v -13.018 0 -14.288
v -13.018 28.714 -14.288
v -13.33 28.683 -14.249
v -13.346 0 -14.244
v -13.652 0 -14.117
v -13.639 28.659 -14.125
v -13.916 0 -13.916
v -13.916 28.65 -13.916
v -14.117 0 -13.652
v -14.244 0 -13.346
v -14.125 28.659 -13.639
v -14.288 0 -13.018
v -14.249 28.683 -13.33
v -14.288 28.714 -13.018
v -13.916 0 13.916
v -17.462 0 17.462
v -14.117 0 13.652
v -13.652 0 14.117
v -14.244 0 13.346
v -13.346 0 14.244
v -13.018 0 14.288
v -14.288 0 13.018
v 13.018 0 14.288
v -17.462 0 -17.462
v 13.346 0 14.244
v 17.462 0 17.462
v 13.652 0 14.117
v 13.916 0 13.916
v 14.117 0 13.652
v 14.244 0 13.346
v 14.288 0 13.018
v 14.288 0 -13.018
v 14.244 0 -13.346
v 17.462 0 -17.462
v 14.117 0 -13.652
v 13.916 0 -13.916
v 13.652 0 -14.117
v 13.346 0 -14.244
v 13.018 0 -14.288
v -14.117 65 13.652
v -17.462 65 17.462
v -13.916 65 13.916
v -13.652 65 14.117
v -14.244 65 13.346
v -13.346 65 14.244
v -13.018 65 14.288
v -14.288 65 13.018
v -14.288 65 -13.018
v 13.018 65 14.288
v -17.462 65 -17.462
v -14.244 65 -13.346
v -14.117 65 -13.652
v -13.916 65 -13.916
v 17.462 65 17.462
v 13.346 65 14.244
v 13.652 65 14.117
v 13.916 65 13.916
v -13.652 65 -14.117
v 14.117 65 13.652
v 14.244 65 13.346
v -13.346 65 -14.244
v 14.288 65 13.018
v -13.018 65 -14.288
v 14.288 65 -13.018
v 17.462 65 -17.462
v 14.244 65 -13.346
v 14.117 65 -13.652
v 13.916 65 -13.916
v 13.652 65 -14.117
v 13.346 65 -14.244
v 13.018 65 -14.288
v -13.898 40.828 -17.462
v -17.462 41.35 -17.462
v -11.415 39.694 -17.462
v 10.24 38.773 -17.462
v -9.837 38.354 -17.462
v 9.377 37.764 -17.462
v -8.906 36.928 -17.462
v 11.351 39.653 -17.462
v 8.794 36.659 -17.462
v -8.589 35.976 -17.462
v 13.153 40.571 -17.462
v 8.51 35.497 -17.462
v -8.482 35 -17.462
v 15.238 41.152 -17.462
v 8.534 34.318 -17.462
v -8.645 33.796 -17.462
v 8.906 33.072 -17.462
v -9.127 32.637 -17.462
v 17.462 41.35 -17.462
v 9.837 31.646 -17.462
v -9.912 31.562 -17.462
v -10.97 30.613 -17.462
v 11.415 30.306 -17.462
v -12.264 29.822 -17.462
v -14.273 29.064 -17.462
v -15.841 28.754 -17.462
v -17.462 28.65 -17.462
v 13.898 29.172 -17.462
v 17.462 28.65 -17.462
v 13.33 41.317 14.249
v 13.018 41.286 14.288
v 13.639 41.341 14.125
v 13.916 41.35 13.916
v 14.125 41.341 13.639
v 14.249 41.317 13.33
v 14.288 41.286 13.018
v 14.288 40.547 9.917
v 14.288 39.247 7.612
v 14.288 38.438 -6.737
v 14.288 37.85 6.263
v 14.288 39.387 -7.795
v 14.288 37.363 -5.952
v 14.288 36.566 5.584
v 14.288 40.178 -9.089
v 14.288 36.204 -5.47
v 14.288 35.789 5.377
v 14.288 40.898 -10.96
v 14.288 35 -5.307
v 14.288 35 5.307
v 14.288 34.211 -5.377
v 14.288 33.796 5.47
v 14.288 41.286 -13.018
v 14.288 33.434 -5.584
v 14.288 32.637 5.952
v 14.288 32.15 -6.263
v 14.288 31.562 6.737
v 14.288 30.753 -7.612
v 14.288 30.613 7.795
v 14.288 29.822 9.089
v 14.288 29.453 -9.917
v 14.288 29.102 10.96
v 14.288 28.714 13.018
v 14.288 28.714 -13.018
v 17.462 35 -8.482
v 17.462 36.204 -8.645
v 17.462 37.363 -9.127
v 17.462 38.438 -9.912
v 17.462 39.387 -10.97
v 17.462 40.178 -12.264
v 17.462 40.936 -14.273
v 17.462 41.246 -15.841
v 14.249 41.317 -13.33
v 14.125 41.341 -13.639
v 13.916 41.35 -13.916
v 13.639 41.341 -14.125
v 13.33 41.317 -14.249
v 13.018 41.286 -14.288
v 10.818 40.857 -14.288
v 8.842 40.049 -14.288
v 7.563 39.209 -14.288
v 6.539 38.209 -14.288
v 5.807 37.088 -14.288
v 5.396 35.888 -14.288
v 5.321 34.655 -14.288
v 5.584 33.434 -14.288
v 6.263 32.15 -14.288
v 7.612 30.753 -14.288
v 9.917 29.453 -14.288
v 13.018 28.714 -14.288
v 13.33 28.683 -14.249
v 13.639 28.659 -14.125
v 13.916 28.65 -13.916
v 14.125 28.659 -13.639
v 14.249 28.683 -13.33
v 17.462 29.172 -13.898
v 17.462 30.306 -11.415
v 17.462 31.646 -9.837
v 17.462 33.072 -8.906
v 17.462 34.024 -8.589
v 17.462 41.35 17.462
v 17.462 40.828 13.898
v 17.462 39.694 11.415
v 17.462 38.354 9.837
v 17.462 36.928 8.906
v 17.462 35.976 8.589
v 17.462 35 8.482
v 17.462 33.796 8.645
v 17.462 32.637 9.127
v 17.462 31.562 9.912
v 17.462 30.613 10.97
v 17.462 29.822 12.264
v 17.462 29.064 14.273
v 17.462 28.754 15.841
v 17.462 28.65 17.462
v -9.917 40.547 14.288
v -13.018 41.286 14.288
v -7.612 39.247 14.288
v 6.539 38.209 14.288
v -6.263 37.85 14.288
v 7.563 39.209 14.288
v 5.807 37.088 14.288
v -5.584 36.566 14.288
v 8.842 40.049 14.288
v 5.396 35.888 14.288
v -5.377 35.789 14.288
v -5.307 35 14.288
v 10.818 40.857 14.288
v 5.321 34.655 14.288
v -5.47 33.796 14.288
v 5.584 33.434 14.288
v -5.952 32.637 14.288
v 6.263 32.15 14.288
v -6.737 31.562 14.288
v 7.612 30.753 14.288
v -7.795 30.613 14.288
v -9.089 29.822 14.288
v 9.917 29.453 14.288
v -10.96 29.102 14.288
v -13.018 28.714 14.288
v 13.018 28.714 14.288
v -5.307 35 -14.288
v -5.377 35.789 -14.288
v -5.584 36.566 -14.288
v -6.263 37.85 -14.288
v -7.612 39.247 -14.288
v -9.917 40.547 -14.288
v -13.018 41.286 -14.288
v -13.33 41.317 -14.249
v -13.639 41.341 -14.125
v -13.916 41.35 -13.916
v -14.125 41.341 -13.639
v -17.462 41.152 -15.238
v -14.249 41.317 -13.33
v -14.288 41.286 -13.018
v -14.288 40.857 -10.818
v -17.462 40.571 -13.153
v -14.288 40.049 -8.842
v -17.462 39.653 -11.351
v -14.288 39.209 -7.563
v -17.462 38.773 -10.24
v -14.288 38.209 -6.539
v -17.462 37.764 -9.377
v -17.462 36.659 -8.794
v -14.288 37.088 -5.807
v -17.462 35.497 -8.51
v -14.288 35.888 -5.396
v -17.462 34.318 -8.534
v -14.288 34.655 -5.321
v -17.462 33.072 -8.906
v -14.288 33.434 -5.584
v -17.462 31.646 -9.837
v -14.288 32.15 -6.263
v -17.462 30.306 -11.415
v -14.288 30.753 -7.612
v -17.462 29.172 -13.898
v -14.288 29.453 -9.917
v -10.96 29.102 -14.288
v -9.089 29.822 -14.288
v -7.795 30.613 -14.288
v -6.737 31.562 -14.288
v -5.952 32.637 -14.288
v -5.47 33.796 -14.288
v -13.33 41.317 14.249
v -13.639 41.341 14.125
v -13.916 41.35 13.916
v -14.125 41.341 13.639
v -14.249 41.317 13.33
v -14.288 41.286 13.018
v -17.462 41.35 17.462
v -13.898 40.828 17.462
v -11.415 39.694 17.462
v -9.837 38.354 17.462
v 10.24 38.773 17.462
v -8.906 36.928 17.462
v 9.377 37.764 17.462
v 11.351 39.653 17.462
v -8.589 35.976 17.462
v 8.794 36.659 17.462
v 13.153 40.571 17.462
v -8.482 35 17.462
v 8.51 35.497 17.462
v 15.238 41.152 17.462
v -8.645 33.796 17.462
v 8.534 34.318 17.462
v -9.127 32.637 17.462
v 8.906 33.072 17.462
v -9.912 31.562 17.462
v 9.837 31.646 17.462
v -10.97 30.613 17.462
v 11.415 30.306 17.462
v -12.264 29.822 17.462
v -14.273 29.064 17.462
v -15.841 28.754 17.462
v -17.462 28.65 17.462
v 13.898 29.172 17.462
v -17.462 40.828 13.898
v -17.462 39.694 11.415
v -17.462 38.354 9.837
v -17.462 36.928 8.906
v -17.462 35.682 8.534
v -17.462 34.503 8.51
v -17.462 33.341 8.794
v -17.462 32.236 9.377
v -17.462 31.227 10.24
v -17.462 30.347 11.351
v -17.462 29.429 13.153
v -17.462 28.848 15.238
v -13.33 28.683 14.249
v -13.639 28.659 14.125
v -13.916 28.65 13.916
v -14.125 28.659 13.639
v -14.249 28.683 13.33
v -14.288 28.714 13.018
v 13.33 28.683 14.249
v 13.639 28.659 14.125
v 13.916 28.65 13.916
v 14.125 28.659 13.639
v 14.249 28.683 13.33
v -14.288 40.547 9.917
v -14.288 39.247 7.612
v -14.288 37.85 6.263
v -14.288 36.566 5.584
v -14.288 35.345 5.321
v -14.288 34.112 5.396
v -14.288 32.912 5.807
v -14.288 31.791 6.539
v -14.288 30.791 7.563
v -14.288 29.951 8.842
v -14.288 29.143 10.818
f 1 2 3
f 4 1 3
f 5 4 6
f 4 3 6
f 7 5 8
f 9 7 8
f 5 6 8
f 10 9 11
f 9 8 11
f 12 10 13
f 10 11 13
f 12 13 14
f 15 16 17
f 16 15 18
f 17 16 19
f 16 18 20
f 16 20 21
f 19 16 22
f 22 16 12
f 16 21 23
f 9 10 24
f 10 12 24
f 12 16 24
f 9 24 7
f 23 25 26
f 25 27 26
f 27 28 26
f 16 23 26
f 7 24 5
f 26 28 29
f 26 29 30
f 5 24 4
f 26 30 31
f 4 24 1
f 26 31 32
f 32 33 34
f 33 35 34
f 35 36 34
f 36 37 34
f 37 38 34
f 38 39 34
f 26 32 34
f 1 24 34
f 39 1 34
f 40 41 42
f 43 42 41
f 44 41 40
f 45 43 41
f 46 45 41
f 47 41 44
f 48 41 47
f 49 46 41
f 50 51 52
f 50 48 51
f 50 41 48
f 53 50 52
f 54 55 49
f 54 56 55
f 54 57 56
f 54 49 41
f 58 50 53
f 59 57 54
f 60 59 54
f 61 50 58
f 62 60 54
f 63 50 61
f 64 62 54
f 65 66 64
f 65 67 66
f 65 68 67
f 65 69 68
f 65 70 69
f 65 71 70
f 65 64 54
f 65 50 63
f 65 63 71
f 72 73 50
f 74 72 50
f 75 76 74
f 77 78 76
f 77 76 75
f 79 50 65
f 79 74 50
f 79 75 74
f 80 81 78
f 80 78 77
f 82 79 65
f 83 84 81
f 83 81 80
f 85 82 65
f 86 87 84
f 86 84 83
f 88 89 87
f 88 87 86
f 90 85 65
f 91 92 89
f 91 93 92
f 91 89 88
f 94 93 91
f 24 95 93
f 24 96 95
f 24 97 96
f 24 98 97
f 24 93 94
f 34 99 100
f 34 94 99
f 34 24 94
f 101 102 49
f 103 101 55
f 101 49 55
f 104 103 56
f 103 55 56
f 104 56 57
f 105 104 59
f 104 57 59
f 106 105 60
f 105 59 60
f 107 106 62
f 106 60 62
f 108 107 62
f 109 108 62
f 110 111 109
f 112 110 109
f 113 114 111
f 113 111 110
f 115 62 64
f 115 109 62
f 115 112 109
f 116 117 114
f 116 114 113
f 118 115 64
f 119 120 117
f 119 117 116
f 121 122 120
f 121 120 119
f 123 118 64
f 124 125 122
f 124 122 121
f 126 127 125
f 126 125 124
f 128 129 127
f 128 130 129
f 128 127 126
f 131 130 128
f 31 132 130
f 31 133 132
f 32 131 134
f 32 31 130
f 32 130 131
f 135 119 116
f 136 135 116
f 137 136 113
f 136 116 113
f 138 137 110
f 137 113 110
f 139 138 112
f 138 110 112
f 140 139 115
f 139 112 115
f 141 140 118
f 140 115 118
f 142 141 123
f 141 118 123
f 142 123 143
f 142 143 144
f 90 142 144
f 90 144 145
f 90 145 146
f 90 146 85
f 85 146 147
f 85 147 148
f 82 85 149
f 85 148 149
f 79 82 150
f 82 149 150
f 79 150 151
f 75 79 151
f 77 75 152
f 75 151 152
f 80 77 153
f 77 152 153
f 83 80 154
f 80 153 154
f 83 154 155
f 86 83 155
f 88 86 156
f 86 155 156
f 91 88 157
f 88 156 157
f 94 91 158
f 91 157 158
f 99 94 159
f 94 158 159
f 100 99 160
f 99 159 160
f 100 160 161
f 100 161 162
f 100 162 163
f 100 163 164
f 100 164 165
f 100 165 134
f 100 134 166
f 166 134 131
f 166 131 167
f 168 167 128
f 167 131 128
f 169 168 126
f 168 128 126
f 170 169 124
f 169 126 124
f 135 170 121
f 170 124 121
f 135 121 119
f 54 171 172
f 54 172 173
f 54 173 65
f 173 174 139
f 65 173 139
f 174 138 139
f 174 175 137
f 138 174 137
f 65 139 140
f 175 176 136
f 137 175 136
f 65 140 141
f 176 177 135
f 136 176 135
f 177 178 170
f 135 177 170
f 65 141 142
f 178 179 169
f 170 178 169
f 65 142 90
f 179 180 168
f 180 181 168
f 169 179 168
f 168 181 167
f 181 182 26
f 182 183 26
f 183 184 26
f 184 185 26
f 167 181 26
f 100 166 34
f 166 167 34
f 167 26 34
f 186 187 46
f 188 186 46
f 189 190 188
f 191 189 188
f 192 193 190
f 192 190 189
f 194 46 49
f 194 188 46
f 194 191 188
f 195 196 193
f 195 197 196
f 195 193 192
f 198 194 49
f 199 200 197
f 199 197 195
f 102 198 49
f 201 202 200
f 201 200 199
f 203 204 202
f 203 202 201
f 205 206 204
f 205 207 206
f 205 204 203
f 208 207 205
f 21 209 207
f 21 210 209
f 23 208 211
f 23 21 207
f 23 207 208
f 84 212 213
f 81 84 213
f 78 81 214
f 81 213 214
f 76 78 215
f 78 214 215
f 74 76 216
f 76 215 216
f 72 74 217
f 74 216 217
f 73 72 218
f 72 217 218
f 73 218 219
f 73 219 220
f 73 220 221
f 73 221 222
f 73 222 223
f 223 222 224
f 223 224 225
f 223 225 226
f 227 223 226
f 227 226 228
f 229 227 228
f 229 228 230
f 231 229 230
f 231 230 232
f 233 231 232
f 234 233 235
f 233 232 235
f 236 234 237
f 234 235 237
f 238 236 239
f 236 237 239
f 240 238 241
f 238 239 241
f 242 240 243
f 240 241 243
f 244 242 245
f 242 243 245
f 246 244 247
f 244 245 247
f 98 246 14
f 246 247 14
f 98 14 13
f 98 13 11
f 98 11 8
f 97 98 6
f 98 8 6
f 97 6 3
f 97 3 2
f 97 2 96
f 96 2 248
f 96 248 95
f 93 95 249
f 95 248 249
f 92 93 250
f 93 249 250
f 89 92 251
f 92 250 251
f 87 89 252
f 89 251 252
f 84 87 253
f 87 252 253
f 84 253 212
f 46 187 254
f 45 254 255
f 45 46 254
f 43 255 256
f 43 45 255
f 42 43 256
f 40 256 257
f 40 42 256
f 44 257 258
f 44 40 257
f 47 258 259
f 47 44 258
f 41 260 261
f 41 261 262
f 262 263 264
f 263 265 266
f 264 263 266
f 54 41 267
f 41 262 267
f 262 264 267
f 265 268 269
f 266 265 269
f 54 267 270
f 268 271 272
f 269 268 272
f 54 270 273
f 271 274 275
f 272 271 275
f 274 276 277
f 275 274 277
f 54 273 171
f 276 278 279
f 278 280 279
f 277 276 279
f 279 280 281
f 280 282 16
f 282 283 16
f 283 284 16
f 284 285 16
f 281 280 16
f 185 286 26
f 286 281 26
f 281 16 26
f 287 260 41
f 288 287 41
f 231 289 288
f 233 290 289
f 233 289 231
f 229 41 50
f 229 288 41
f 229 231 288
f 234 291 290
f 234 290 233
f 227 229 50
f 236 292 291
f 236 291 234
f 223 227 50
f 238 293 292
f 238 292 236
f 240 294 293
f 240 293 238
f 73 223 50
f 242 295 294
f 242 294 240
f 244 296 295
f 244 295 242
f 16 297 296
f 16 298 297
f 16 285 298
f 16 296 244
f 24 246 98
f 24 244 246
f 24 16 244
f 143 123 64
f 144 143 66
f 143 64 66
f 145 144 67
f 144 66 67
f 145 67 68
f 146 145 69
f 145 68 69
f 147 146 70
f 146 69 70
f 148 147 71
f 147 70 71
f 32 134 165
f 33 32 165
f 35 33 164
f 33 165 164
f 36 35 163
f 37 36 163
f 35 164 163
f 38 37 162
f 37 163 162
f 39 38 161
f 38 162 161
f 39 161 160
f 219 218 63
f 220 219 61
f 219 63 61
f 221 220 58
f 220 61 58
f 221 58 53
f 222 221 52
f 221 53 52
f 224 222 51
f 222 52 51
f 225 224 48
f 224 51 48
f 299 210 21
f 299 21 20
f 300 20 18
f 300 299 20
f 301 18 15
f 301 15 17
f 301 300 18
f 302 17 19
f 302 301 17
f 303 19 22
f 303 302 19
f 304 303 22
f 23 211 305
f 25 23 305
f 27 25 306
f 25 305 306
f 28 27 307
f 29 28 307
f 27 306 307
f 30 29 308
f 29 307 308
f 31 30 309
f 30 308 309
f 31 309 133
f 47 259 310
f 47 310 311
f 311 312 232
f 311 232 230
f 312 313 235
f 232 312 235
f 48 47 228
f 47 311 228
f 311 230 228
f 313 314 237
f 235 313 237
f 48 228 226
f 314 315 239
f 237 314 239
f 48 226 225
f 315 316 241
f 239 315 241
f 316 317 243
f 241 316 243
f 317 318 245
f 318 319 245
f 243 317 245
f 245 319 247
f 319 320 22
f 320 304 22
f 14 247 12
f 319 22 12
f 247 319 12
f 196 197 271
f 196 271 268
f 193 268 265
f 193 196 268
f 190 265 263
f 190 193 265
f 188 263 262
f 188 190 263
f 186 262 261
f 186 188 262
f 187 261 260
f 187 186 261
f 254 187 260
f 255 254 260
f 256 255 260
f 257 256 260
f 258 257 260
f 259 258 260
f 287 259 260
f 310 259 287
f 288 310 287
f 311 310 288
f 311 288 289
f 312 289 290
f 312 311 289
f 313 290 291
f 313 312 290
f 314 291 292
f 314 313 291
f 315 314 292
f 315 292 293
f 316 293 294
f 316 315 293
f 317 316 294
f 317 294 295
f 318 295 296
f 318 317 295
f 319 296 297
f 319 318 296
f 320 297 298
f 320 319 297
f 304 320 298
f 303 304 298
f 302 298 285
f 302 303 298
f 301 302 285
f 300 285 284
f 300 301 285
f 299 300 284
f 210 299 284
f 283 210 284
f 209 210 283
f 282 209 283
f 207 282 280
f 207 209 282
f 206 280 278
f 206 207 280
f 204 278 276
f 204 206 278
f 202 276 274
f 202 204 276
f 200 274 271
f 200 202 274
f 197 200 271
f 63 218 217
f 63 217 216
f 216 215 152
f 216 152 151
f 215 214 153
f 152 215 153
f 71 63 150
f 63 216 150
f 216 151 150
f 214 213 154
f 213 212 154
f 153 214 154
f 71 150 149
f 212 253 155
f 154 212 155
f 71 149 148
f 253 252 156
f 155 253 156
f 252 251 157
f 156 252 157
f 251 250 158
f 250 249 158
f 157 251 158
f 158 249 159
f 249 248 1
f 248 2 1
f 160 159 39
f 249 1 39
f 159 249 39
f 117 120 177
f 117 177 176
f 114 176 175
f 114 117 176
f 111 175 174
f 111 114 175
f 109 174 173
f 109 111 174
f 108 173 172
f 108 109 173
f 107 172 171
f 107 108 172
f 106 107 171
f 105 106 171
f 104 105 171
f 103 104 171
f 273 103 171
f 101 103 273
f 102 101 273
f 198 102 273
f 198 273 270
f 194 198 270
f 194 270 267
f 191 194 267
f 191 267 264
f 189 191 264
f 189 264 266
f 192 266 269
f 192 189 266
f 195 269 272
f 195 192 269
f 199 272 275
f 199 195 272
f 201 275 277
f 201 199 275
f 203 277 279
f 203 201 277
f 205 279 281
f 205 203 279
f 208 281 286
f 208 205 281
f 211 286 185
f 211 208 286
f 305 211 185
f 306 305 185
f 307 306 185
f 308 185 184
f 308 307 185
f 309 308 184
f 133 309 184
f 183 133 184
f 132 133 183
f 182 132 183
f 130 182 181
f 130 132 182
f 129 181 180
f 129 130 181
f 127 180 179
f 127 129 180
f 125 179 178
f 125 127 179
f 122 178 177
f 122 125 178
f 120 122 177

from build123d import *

# Parameters (mm, degrees)
SKETCH1_W               = 34.925
SKETCH1_H               = 34.925
SKETCH1_W_2             = 28.575
SKETCH1_H_2             = 28.575
BOSS_EXTRUDE1_DEPTH     = 65
FILLET1_R               = 1.27
SKETCH2_R               = 6.35
CUT_EXTRUDE1_DEPTH      = 25.695704333
CUT_EXTRUDE1_DEPTH_BACK = 25.695704333
SKETCH3_R               = 6.35
CUT_EXTRUDE2_DEPTH      = 25.695704474
CUT_EXTRUDE2_DEPTH_BACK = 25.695704474


with BuildPart() as part:
    # Sketch1 → Boss-Extrude1 (new body)
    with BuildSketch(Plane(origin=(0, 0, 0), x_dir=(1, 0, 0), z_dir=(0, 1, 0))):
        Rectangle(SKETCH1_W, SKETCH1_H)
        Rectangle(SKETCH1_W_2, SKETCH1_H_2, mode=Mode.SUBTRACT)
    extrude(amount=BOSS_EXTRUDE1_DEPTH)

    # Fillet1
    fillet1_edges = [part.edges().sort_by_distance(p)[0] for p in [
        (-14.2875, 32.5, 14.2875),
        (14.2875, 32.5, 14.2875),
        (14.2875, 32.5, -14.2875),
        (-14.2875, 32.5, -14.2875),
    ]]
    fillet(fillet1_edges, radius=FILLET1_R)

    # Sketch2 → Cut-Extrude1 (cut, two sides)
    with BuildSketch(Plane(origin=(0, 0, 0), x_dir=(0.707106781, 0, 0.707106781), z_dir=(-0.707106781, 0, 0.707106781))) as cut_extrude1_sk:
        with Locations((0, 35)):
            Circle(SKETCH2_R)
    extrude(amount=CUT_EXTRUDE1_DEPTH, mode=Mode.SUBTRACT)
    extrude(cut_extrude1_sk.sketch, amount=-CUT_EXTRUDE1_DEPTH_BACK, mode=Mode.SUBTRACT)

    # Sketch3 → Cut-Extrude2 (cut, two sides)
    with BuildSketch(Plane(origin=(0, 0, 0), x_dir=(0.707106781, 0, -0.707106781), z_dir=(0.707106781, 0, 0.707106781))) as cut_extrude2_sk:
        with Locations((0, 35)):
            Circle(SKETCH3_R)
    extrude(amount=CUT_EXTRUDE2_DEPTH, mode=Mode.SUBTRACT)
    extrude(cut_extrude2_sk.sketch, amount=-CUT_EXTRUDE2_DEPTH_BACK, mode=Mode.SUBTRACT)


solid = part.part
